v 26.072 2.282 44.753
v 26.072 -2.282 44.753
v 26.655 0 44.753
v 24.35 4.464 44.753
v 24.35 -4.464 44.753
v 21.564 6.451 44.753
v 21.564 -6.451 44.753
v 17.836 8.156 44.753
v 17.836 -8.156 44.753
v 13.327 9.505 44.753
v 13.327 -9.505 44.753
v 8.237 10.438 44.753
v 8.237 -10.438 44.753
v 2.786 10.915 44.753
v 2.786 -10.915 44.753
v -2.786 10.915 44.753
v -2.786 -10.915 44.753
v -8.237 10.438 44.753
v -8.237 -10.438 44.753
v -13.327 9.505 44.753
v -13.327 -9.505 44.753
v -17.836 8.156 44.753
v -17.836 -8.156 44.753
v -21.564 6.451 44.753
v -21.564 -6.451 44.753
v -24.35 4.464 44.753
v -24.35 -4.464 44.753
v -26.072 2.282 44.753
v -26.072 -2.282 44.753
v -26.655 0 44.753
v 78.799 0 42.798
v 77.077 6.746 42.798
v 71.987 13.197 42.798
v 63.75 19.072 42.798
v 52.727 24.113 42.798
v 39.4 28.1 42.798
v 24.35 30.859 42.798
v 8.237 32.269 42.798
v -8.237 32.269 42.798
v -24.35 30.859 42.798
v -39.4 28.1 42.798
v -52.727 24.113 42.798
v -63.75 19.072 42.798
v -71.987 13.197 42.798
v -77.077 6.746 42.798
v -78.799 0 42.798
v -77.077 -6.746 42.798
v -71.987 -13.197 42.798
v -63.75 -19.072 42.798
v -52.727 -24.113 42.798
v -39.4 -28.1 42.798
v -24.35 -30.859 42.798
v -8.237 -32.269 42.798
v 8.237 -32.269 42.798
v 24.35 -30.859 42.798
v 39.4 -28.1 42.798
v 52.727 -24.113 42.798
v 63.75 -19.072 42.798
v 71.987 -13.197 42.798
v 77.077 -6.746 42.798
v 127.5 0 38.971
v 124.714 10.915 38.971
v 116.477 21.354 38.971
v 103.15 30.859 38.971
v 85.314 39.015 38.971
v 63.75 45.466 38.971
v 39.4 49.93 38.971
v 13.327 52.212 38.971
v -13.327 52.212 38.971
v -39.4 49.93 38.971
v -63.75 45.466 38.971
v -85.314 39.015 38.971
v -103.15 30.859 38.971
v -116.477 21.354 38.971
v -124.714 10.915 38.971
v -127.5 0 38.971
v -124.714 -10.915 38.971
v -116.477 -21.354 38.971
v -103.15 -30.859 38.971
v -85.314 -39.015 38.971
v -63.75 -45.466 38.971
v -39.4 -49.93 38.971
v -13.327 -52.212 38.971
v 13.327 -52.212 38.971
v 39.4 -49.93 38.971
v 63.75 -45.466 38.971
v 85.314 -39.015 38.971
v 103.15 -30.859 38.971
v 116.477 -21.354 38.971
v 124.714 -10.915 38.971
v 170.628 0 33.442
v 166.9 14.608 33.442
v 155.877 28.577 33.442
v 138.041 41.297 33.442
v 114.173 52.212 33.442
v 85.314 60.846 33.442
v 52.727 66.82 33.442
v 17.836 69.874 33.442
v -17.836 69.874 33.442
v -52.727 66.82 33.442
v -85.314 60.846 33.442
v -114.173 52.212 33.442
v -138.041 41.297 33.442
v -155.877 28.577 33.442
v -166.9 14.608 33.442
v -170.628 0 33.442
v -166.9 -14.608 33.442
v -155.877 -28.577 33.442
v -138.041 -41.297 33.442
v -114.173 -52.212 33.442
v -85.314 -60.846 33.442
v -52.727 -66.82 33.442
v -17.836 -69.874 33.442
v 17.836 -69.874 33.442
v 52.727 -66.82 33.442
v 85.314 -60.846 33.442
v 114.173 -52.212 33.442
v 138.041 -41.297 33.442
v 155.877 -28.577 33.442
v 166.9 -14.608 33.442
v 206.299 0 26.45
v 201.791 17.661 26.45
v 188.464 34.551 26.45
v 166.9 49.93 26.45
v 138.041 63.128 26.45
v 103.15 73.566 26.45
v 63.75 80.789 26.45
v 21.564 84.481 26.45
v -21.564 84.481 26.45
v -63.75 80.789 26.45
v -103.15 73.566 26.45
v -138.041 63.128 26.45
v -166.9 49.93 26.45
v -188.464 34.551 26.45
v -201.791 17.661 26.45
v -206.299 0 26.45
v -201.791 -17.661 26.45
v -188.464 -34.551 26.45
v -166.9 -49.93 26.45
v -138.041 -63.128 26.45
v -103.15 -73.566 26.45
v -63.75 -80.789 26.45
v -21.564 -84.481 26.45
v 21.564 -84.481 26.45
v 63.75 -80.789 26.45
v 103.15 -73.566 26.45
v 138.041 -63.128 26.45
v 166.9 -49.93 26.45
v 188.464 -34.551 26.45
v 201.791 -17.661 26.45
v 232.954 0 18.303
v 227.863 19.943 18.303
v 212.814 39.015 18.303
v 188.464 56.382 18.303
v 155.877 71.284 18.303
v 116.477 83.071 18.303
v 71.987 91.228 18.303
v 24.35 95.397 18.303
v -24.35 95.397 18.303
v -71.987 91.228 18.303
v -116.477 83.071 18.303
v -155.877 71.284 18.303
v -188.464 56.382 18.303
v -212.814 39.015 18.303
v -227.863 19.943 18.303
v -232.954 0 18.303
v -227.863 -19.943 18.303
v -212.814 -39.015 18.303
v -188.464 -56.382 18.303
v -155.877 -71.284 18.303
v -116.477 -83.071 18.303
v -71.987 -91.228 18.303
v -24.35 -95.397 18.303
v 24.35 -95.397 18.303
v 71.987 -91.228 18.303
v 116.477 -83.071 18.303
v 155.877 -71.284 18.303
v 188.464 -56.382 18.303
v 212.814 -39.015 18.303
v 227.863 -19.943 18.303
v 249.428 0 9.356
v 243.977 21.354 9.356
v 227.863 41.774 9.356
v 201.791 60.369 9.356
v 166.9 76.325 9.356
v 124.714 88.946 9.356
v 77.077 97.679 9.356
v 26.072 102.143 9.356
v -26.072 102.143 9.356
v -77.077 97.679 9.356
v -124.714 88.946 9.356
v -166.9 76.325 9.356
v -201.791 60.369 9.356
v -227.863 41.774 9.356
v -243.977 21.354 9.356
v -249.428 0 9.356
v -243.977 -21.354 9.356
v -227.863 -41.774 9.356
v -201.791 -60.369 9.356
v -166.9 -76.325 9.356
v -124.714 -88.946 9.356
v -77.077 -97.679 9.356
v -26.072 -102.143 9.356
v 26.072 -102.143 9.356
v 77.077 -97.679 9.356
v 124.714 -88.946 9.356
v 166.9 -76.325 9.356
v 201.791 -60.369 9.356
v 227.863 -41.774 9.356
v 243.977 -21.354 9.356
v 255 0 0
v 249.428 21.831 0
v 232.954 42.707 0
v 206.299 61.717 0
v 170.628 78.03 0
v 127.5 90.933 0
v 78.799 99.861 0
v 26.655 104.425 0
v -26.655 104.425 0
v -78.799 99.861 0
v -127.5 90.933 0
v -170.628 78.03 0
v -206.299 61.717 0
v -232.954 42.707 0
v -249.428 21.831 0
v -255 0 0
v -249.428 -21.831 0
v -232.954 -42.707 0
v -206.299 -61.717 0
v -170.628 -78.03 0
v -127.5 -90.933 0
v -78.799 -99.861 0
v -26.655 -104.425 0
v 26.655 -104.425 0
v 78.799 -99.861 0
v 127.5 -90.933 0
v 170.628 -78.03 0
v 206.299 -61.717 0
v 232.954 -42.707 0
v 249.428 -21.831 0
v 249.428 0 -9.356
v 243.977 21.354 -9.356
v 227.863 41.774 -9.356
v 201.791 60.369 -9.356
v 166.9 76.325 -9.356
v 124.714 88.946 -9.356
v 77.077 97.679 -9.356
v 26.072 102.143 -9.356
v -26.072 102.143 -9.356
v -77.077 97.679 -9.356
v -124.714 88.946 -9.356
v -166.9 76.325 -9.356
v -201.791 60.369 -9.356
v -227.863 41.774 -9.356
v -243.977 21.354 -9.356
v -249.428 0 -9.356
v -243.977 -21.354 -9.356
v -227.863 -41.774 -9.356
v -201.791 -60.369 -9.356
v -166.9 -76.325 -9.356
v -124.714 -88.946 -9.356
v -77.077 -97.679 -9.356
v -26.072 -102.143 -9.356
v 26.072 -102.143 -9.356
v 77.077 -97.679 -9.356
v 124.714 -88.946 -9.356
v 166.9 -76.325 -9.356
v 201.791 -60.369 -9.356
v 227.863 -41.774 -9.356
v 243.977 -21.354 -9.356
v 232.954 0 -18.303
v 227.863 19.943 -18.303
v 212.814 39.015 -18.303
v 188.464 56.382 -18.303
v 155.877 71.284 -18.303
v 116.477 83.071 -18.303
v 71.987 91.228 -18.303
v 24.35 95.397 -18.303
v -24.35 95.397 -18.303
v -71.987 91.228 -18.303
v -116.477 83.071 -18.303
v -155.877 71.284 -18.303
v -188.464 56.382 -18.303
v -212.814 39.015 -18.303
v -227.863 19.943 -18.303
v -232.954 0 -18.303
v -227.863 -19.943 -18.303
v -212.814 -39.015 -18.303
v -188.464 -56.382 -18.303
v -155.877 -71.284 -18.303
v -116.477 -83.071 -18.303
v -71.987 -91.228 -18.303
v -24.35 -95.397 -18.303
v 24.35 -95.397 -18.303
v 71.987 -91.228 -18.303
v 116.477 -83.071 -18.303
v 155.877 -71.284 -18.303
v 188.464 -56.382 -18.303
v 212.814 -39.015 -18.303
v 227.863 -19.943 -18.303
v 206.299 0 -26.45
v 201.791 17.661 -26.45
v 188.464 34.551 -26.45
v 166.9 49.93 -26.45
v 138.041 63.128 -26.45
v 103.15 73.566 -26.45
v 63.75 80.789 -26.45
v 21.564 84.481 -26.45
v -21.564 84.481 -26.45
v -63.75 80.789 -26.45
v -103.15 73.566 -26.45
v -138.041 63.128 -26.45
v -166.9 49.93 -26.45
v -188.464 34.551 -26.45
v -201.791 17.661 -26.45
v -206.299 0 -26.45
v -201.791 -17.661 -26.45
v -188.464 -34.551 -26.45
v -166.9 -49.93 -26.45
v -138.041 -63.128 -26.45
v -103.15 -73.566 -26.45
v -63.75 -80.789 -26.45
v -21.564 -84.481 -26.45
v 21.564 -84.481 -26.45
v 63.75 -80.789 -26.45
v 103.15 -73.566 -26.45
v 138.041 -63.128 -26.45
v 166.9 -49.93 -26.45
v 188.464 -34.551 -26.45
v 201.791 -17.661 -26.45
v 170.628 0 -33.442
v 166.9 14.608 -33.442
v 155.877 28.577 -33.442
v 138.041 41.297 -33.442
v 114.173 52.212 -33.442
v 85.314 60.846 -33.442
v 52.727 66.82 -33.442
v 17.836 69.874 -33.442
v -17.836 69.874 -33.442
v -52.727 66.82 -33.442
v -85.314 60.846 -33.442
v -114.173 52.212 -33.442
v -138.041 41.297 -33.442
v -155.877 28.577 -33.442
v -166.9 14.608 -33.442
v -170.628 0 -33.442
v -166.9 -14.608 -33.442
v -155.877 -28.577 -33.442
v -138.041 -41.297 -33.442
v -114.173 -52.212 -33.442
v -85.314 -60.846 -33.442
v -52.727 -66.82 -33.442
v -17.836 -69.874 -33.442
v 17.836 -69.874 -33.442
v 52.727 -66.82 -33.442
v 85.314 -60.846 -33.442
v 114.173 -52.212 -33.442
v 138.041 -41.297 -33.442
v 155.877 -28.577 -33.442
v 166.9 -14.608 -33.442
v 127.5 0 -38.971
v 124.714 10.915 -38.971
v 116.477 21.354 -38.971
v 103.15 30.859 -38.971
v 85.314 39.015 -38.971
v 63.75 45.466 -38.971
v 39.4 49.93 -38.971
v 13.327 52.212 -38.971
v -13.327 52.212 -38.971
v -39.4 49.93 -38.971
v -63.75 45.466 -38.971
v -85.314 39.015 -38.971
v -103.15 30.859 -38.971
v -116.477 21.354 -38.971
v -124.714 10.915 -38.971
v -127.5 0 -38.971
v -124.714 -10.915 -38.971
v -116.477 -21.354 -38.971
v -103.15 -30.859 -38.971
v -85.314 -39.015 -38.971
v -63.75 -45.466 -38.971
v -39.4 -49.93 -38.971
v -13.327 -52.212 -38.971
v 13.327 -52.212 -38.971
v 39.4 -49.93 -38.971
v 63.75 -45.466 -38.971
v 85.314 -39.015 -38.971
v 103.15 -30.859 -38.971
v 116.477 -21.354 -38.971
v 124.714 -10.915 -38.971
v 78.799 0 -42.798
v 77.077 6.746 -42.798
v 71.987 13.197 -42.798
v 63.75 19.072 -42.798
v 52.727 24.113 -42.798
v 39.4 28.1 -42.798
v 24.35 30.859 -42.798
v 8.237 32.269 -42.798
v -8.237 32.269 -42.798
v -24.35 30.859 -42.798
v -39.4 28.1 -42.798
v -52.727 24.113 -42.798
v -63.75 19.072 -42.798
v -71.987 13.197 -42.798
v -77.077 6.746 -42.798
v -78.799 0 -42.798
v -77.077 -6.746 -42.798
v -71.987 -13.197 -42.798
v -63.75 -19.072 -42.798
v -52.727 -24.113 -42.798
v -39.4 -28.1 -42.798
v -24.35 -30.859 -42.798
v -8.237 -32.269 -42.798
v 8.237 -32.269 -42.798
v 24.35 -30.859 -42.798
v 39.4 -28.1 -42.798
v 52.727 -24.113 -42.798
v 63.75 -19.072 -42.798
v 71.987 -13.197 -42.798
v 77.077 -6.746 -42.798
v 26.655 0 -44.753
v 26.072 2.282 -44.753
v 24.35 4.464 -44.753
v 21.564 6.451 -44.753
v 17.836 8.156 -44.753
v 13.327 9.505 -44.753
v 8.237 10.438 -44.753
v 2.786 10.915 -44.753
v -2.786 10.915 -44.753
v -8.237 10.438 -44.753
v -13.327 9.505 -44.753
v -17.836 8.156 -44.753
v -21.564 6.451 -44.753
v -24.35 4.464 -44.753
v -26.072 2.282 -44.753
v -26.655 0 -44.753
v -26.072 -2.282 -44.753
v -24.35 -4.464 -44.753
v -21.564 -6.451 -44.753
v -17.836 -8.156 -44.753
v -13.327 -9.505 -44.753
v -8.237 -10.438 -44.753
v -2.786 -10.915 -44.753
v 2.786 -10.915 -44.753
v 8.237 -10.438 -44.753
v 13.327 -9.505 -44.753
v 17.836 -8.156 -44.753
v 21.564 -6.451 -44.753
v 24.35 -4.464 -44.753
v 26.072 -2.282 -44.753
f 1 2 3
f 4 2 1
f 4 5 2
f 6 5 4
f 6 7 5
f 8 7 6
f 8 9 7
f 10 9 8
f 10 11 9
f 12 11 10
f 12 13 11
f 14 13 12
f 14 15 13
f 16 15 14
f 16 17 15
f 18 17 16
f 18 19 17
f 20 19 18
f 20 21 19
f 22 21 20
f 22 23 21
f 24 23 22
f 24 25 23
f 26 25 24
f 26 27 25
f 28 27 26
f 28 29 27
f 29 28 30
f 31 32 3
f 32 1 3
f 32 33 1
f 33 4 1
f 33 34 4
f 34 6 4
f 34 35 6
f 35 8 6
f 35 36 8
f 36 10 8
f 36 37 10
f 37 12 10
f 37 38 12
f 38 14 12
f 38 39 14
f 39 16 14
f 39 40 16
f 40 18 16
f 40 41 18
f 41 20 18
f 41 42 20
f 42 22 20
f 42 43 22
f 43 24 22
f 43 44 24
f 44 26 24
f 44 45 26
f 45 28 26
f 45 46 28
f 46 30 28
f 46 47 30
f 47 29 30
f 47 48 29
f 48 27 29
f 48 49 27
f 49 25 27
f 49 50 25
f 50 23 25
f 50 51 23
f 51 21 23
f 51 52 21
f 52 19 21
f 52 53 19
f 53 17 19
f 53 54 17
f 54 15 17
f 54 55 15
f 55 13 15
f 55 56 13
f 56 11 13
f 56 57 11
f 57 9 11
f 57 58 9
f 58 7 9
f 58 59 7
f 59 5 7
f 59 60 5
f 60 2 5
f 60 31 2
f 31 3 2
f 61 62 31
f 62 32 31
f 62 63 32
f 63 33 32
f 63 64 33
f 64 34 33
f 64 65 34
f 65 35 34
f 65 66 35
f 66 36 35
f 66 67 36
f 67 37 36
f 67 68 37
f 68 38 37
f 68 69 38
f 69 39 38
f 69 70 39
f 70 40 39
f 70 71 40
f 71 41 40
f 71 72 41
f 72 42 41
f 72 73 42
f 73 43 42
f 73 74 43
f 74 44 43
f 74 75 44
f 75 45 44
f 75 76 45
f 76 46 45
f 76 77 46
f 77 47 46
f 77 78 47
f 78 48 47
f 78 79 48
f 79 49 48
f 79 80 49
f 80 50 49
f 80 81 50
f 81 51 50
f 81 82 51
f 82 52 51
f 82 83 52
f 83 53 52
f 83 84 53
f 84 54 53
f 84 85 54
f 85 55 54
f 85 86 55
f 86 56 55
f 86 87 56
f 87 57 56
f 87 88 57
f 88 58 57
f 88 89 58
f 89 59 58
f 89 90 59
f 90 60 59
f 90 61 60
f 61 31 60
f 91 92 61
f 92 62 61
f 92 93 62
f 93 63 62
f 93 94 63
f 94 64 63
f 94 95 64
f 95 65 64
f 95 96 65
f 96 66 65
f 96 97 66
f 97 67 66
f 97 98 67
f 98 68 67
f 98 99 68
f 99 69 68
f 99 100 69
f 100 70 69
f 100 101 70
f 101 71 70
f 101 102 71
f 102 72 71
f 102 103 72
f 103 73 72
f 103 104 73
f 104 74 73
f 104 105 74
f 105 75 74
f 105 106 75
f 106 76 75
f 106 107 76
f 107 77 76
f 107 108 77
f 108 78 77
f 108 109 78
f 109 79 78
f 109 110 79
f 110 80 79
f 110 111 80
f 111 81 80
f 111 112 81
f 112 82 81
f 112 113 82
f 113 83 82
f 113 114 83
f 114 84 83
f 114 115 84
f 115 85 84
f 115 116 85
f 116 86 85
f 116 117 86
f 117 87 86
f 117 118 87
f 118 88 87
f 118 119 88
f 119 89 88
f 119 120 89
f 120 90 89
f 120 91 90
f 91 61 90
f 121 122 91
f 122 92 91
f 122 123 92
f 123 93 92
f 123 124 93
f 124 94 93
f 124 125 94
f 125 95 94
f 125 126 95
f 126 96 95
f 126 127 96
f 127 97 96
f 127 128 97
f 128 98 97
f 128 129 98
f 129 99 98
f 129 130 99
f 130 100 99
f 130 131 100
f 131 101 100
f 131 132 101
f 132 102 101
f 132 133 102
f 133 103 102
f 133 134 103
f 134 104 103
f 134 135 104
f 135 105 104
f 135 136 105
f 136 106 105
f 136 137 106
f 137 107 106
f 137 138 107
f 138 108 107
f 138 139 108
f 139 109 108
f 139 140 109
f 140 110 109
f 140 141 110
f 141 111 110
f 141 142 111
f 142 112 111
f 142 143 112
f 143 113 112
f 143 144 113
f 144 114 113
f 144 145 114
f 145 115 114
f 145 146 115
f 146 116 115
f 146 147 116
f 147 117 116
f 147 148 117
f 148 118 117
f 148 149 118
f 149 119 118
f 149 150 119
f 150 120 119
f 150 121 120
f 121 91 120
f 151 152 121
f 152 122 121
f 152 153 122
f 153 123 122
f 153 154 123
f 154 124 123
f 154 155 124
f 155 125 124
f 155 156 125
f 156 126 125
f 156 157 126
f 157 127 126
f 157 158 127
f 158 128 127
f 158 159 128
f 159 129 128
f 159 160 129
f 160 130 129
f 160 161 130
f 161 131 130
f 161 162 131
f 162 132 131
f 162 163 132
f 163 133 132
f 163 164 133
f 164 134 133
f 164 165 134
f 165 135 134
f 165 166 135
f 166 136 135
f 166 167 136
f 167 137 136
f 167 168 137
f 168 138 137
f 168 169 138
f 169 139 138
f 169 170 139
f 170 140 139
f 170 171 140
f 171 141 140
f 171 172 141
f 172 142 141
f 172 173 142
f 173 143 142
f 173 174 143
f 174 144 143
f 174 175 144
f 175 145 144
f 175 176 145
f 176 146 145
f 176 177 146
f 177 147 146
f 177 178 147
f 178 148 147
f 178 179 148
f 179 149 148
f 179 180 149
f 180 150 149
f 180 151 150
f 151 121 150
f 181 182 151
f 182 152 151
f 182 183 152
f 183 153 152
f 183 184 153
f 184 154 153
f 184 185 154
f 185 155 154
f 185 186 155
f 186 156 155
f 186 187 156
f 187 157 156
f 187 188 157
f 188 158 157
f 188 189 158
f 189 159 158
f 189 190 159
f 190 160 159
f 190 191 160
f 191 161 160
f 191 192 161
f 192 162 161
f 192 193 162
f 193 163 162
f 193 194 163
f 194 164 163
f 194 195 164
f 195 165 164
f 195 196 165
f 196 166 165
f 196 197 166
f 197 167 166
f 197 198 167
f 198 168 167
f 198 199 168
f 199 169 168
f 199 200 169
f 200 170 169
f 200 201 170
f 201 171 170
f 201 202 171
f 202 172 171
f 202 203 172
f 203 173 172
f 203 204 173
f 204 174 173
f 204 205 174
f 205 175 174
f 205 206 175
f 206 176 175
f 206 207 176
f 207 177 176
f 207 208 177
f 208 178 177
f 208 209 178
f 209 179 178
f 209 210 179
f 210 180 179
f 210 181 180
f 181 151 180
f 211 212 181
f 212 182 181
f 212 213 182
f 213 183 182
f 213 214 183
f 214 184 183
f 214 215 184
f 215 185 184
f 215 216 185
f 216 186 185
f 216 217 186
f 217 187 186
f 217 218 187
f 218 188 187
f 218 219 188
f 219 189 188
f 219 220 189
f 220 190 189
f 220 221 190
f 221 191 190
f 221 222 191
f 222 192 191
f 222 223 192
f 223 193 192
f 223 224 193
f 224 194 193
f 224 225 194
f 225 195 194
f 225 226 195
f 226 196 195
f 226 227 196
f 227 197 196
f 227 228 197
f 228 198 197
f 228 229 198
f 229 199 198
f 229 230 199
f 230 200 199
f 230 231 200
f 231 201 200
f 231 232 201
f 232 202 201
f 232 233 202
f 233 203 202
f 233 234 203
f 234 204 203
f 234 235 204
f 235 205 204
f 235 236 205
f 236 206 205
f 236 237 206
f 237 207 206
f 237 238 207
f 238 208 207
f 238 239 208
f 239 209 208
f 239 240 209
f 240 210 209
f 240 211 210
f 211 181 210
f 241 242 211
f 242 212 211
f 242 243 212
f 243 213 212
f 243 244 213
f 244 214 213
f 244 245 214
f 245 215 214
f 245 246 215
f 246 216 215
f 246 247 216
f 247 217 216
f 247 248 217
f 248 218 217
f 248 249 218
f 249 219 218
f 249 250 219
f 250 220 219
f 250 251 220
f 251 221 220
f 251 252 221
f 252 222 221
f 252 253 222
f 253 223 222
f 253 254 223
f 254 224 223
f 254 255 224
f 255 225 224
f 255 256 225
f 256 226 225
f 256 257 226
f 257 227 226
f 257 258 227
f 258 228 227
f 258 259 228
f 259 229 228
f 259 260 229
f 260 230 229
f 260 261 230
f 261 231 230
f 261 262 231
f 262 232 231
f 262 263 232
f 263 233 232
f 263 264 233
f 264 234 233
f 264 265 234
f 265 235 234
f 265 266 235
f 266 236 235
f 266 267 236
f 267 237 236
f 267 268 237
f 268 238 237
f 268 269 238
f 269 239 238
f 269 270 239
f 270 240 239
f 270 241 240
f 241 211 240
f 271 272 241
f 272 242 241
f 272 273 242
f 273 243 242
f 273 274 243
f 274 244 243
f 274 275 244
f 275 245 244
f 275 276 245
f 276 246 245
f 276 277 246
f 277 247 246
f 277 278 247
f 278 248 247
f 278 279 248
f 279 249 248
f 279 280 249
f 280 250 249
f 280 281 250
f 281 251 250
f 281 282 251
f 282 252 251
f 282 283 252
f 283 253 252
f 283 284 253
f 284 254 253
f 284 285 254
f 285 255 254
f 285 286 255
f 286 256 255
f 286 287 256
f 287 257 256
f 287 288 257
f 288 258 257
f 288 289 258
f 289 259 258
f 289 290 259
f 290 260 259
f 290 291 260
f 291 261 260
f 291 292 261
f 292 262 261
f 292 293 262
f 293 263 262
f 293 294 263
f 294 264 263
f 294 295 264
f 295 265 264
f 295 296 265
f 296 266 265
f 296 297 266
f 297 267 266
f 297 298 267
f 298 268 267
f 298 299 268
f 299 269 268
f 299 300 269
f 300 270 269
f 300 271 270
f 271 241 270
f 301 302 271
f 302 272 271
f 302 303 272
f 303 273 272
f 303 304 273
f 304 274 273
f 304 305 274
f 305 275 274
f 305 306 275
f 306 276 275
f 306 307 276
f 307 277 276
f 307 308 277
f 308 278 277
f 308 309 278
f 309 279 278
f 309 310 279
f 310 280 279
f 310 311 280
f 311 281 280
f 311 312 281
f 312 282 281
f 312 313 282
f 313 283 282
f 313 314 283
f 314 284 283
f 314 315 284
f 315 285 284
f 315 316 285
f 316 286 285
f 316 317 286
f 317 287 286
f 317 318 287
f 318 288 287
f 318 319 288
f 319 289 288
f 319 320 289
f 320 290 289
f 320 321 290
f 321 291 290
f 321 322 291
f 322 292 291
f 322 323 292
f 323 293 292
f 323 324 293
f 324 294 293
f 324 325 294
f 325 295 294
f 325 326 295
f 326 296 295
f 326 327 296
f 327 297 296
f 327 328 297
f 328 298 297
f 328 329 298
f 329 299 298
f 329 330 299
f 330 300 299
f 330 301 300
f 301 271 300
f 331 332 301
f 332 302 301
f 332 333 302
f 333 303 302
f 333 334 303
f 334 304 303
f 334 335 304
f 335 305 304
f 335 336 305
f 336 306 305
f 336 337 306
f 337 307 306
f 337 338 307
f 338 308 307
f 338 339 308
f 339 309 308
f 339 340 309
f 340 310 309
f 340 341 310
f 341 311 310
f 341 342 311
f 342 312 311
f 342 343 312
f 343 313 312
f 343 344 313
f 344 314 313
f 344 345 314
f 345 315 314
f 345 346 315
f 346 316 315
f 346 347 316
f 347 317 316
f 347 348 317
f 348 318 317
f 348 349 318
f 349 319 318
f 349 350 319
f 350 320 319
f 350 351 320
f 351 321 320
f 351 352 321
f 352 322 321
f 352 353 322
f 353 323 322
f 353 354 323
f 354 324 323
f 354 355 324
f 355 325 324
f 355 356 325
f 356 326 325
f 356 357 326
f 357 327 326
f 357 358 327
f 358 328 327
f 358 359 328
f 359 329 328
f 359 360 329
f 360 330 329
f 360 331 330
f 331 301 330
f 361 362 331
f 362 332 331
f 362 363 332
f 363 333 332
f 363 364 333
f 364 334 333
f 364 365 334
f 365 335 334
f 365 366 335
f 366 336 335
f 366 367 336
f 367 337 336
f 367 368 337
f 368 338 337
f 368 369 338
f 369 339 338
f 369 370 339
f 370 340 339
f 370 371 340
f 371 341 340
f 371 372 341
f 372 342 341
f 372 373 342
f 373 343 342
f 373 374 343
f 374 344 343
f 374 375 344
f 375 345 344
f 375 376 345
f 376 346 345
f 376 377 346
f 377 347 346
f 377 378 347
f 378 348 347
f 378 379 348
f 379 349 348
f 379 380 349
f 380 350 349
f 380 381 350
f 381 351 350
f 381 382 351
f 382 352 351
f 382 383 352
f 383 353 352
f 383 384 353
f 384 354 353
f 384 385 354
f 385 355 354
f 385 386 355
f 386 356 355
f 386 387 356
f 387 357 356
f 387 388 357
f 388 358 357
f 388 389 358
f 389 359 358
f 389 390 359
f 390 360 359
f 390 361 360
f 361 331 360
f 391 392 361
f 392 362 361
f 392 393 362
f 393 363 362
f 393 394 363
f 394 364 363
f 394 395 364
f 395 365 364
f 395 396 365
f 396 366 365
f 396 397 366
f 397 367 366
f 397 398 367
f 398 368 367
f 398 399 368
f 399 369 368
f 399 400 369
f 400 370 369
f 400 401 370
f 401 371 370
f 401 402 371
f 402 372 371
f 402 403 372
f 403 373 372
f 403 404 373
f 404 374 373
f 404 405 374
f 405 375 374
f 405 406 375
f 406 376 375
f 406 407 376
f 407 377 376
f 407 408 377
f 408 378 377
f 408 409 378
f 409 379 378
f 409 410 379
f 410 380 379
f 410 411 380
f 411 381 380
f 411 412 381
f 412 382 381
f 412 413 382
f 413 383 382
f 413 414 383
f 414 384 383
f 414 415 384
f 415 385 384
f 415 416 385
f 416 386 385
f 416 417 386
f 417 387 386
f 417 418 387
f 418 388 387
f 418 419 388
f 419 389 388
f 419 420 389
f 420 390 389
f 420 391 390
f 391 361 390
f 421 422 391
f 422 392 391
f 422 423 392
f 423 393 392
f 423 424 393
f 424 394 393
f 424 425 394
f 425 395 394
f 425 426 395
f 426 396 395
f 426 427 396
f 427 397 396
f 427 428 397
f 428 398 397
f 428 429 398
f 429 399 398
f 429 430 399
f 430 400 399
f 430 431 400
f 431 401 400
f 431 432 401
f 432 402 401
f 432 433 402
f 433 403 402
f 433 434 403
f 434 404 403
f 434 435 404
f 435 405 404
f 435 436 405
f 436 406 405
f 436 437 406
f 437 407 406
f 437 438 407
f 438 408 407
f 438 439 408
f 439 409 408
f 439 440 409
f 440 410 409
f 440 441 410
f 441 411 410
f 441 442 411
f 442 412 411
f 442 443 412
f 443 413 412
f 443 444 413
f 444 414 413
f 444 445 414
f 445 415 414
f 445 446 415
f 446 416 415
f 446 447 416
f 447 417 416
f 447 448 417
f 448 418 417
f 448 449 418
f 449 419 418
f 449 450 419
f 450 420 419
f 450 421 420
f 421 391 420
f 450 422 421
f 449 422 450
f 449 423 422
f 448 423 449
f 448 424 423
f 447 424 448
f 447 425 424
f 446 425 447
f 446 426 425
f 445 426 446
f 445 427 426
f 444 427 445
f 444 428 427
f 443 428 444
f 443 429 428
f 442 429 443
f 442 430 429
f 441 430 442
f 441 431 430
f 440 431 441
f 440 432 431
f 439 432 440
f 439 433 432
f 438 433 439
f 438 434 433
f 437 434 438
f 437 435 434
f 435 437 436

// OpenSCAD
// Generated by SolidPython 1.0.1 on 2020-07-29 00:46:52


scale(v = [17, 7, 3]) {
	sphere(r = 15);
}
/***********************************************
*********      SolidPython code:      **********
************************************************
 
# import packages: SolidPython
from solid import *
from solid.utils import *
from itertools import chain, combinations, permutations


class Resize:

    def __init__(self, scad_file):
        self.scad_file = scad_file
        #self.scad_file = import_scad(scad_file)
        # cone/cylinder param:
        self.r1 = 0
        self.r2 = 0
        self.h = 0
        # rectangular prism param:
        self.w = 0
        self.l = 0
        # ellipse param:
        self.r = 0

    # import OpenScad code (file name corresponds to shape)


    # classify shape + parameters
    def assign(self, param1, param2, param3):
        if self.scad_file == 'cone.scad':
            self.r1 = param1
            self.r2 = param2
            self.h = param3
        elif self.scad_file == 'cylinder.scad':
            self.r1 = param1
            self.r2 = param2
            self.h = param3
        elif self.scad_file == 'rectangularPrism.scad':
            self.h = param1
            self.l = param2
            self.w = param3
        else:
            self.r = param1
            self.h = param2

    # resize parameters
    def iterate(self):
        x = range(3, 20, 2)
        i = 1
        if self.scad_file == 'cone.scad':
            tempList = list(permutations(x, 2))
            for temp in tempList:
                param1 = temp[0]
                param2 = temp[1]
                filepath = 'produced_scad_files/' + 'cone' + str(param1) + '_' + str(param2) + '_' + '.scad'
                scad_render_to_file(cylinder(h=param1, r1=param2, r2=0), filepath)

        elif self.scad_file == 'cylinder.scad':
            tempList = list(permutations(x, 3))
            for temp in tempList:
                param1 = temp[0]
                param2 = temp[1]
                filepath = 'produced_scad_files/' + 'cylinder' + str(param1) + '_' + str(param2) + '_' + '.scad'
                scad_render_to_file(cylinder(h=param1, r1=param2, r2=param2), filepath)

        elif self.scad_file == 'rectangularPrism.scad':
            tempList = list(permutations(x, 3))
            for temp in tempList:
                param1 = temp[0]
                param2 = temp[1]
                param3 = temp[2]
                filepath = 'produced_scad_files/' + 'rectangularPrism' + str(param1) + '_' + str(param2) + '_' + str(
                    param3) + '.scad'
                scad_render_to_file(cube(size=(param1, param2, param3)), filepath)

        elif self.scad_file == 'ellipse.scad':
            tempList = list(permutations(x, 4))
            for temp in tempList:
                param1 = temp[0]
                param2 = temp[1]
                param3 = temp[2]
                param4 = temp[3]
                filepath = 'produced_scad_files/' + 'ellipse' + str(param1) + '_' + str(param2) + '_' + str(param3) + '_' + str(param4) + '.scad'
                scad_render_to_file(scale([param1, param2, param3])(sphere(r=param4)), filepath)

    def render_to_scadfile(self):
        scad_render_to_file(scad, 'example.scad') 
 
************************************************/
